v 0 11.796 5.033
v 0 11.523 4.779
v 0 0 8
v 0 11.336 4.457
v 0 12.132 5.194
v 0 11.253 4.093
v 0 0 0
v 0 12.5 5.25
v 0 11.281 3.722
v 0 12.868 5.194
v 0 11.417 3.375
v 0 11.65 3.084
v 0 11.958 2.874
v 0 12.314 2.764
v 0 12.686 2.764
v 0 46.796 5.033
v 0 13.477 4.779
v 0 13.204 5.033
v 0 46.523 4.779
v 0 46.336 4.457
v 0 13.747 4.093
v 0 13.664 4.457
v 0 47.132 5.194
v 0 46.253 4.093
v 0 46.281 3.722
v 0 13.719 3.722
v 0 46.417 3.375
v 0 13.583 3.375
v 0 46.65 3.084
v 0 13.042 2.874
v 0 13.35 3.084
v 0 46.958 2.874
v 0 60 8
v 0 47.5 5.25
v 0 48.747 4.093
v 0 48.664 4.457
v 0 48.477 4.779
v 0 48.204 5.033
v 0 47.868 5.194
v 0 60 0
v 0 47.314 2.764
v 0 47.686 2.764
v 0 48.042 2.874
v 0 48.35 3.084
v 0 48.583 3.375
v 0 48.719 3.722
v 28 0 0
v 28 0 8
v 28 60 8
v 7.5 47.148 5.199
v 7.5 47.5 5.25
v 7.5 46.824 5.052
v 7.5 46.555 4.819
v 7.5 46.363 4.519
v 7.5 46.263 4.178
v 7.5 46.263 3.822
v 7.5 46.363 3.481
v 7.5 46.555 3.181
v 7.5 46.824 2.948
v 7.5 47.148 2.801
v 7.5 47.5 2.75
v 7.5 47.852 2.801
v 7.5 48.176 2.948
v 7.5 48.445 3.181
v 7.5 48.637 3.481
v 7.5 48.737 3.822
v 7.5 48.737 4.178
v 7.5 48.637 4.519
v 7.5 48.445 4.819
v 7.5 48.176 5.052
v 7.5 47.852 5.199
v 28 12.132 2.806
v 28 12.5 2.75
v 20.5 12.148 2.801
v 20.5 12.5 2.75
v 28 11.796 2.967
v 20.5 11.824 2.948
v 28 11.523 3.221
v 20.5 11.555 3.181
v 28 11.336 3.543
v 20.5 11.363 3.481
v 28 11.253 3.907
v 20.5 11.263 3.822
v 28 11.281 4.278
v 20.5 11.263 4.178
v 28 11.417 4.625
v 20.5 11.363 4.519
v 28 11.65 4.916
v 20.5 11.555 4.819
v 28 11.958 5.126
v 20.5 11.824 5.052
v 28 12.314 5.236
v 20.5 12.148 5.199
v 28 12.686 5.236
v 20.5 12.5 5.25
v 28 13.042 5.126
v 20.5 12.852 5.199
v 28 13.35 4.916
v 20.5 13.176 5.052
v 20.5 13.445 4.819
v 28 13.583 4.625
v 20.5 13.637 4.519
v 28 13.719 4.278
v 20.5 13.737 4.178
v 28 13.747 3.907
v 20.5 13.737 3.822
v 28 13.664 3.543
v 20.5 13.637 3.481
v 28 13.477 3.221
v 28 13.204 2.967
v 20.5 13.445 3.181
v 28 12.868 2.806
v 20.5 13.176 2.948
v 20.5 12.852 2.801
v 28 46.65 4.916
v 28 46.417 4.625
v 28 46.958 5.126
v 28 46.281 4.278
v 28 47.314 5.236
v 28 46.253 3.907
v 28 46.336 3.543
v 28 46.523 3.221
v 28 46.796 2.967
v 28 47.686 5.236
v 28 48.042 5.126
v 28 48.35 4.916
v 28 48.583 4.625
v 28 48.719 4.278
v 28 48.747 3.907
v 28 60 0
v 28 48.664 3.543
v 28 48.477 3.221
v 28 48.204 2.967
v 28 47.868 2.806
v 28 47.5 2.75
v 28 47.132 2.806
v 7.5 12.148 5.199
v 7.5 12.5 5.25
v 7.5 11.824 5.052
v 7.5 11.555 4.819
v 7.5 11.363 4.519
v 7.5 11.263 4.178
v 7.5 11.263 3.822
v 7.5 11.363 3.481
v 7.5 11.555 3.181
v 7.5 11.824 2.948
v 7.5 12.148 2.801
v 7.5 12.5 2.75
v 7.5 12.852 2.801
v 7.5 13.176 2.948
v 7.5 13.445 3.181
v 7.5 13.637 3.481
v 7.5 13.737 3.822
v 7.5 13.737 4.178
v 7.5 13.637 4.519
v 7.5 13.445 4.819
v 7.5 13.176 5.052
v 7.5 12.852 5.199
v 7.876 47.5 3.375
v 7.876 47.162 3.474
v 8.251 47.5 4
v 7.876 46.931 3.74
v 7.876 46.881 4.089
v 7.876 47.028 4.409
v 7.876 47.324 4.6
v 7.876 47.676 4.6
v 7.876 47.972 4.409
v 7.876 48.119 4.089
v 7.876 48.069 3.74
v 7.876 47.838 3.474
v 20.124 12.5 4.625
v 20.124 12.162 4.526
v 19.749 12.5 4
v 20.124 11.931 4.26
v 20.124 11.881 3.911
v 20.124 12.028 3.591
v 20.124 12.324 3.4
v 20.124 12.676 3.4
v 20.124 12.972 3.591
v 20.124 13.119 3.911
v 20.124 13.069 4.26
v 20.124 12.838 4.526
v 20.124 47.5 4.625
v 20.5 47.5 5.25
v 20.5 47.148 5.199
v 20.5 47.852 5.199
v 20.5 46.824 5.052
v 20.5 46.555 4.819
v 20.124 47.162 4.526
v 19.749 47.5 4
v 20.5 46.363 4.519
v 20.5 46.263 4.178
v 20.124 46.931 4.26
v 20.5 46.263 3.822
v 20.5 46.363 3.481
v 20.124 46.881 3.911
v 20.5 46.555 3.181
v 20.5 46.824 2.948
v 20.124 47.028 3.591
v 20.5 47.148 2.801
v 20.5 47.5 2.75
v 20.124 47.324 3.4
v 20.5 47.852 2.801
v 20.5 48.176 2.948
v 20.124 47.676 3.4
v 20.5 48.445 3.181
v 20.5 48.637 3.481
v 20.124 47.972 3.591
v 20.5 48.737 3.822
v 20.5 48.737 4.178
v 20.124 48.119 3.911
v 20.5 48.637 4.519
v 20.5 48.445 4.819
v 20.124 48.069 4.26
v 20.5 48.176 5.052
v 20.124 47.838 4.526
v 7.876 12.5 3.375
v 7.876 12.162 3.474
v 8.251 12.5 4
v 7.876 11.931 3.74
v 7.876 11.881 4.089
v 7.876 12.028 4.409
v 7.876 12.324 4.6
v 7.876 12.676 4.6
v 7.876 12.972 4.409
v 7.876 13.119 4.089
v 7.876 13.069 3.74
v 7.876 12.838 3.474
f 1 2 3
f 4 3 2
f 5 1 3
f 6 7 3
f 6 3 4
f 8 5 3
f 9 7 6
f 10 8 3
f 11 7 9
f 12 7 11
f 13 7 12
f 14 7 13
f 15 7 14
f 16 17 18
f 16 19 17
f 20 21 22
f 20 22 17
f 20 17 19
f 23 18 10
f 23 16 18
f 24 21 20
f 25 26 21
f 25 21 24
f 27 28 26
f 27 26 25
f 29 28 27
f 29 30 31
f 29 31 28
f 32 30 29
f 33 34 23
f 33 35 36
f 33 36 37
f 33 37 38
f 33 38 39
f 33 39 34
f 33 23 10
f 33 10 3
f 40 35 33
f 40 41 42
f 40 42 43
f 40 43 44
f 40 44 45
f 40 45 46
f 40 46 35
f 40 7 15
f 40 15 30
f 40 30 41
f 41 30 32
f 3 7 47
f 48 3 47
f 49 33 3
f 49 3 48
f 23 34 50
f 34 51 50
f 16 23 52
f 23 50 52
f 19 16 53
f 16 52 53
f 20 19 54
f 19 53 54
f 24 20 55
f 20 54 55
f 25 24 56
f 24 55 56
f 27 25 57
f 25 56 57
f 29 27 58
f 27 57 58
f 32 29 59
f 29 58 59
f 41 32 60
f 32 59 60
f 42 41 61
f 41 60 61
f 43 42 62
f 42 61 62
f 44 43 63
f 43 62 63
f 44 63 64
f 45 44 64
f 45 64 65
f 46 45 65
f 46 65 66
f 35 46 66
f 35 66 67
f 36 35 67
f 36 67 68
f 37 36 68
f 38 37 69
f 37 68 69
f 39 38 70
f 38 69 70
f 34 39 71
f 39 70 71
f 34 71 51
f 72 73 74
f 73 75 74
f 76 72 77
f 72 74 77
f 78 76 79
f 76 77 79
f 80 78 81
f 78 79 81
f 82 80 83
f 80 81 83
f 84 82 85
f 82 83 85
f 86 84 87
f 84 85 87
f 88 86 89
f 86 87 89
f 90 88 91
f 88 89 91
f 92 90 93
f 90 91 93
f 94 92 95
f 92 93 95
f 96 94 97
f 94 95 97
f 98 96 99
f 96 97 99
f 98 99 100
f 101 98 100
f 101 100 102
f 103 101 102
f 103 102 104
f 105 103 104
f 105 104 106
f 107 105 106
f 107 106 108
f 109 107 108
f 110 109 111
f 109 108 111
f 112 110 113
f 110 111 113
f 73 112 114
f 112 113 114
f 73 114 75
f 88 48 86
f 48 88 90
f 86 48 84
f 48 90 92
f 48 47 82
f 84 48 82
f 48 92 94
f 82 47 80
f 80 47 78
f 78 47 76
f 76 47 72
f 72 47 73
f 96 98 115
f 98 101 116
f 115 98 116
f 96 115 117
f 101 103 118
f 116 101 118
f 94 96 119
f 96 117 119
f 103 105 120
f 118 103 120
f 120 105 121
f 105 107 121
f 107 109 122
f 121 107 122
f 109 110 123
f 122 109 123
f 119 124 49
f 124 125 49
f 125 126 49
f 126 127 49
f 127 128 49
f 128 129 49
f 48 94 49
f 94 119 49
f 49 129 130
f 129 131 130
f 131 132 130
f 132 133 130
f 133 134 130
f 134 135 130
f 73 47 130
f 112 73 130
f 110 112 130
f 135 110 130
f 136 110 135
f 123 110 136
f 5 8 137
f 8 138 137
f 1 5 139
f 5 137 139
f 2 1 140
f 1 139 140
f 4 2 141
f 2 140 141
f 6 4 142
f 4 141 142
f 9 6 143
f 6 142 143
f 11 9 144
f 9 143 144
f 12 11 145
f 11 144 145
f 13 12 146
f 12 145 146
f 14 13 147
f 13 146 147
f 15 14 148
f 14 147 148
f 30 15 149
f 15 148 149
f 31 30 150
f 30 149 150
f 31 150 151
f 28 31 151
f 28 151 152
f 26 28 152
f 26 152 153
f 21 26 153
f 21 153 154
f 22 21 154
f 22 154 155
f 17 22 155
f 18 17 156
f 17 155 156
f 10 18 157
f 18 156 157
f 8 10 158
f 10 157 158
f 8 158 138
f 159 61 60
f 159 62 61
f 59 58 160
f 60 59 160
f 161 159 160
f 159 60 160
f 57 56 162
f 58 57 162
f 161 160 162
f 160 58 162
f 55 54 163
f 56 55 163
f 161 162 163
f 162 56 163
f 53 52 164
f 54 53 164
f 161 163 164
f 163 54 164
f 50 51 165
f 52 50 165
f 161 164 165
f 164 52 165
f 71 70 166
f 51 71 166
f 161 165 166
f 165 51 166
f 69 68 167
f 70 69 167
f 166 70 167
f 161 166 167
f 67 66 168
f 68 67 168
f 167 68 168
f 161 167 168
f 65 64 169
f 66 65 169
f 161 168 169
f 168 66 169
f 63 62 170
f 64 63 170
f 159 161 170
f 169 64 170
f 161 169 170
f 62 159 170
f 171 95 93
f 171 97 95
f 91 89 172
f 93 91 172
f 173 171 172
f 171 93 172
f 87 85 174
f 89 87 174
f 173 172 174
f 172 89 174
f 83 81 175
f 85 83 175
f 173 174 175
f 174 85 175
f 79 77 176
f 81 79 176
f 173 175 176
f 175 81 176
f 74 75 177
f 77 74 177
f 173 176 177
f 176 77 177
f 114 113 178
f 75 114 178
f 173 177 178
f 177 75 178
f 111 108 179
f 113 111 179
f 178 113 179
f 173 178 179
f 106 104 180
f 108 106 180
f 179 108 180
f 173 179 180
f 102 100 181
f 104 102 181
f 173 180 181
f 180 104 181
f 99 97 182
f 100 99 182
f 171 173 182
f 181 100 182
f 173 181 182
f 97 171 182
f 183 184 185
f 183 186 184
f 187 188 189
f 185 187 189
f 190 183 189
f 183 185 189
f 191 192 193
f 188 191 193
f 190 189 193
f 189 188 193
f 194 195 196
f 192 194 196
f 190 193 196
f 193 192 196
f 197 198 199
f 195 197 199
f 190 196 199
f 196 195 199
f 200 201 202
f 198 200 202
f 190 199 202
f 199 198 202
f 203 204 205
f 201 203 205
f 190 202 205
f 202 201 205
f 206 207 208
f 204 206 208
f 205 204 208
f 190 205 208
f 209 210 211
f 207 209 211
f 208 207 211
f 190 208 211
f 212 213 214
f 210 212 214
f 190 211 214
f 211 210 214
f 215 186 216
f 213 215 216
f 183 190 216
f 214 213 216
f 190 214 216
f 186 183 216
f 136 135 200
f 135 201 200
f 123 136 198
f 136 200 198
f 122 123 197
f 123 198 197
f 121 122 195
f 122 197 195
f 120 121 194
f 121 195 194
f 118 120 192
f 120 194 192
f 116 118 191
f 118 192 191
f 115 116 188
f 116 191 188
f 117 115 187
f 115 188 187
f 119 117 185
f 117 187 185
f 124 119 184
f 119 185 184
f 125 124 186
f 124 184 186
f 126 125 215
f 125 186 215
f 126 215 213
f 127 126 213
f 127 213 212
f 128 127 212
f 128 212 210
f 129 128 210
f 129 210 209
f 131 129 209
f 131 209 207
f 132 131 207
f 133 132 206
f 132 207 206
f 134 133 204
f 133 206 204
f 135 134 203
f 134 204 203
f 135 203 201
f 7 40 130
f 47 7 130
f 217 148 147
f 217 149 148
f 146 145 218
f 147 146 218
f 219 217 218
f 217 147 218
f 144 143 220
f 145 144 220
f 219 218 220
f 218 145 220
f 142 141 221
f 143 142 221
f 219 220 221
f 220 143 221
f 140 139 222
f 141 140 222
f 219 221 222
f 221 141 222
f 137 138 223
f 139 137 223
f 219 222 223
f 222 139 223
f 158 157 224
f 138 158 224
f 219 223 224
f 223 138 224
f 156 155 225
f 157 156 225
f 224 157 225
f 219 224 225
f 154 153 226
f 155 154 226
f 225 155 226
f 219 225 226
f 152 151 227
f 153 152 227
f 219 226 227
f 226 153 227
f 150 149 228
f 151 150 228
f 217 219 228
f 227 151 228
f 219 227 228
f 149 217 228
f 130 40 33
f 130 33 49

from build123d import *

# Parameters (mm, degrees)
SKETCH_1_W      = 28
SKETCH_1_H      = 60
EXTRUDE_1_DEPTH = 8
M3X0_5_1_D      = 2.5
M3X0_5_1_DEPTH  = 7.5
M3X0_5_1_TIP    = 0.751075774
M3X0_5_2_D      = 2.5
M3X0_5_2_DEPTH  = 7.5
M3X0_5_2_TIP    = 0.751075774


with BuildPart() as part:
    # ｽｹｯﾁ1 → ﾎﾞｽ - 押し出し1 (new body)
    with BuildSketch(Plane.XY):
        with Locations((14, 30)):
            Rectangle(SKETCH_1_W, SKETCH_1_H)
    extrude(amount=EXTRUDE_1_DEPTH)

    # M3x0.5 ねじ穴1
    with Locations(Plane(origin=(0, 47.5, 4), x_dir=(0, 0, -1), z_dir=(-1, 0, 0))):
        with Locations((0, 0), (0, 35)):
            Hole(M3X0_5_1_D / 2, depth=M3X0_5_1_DEPTH)
            with Locations((0, 0, -(M3X0_5_1_DEPTH + M3X0_5_1_TIP / 2))):  # 118° drill point
                Cone(0, M3X0_5_1_D / 2, M3X0_5_1_TIP, mode=Mode.SUBTRACT)

    # M3x0.5 ねじ穴2
    with Locations(Plane(origin=(28, 47.5, 4), x_dir=(0, 0, 1), z_dir=(1, 0, 0))):
        with Locations((0, 0), (0, 35)):
            Hole(M3X0_5_2_D / 2, depth=M3X0_5_2_DEPTH)
            with Locations((0, 0, -(M3X0_5_2_DEPTH + M3X0_5_2_TIP / 2))):  # 118° drill point
                Cone(0, M3X0_5_2_D / 2, M3X0_5_2_TIP, mode=Mode.SUBTRACT)


solid = part.part
